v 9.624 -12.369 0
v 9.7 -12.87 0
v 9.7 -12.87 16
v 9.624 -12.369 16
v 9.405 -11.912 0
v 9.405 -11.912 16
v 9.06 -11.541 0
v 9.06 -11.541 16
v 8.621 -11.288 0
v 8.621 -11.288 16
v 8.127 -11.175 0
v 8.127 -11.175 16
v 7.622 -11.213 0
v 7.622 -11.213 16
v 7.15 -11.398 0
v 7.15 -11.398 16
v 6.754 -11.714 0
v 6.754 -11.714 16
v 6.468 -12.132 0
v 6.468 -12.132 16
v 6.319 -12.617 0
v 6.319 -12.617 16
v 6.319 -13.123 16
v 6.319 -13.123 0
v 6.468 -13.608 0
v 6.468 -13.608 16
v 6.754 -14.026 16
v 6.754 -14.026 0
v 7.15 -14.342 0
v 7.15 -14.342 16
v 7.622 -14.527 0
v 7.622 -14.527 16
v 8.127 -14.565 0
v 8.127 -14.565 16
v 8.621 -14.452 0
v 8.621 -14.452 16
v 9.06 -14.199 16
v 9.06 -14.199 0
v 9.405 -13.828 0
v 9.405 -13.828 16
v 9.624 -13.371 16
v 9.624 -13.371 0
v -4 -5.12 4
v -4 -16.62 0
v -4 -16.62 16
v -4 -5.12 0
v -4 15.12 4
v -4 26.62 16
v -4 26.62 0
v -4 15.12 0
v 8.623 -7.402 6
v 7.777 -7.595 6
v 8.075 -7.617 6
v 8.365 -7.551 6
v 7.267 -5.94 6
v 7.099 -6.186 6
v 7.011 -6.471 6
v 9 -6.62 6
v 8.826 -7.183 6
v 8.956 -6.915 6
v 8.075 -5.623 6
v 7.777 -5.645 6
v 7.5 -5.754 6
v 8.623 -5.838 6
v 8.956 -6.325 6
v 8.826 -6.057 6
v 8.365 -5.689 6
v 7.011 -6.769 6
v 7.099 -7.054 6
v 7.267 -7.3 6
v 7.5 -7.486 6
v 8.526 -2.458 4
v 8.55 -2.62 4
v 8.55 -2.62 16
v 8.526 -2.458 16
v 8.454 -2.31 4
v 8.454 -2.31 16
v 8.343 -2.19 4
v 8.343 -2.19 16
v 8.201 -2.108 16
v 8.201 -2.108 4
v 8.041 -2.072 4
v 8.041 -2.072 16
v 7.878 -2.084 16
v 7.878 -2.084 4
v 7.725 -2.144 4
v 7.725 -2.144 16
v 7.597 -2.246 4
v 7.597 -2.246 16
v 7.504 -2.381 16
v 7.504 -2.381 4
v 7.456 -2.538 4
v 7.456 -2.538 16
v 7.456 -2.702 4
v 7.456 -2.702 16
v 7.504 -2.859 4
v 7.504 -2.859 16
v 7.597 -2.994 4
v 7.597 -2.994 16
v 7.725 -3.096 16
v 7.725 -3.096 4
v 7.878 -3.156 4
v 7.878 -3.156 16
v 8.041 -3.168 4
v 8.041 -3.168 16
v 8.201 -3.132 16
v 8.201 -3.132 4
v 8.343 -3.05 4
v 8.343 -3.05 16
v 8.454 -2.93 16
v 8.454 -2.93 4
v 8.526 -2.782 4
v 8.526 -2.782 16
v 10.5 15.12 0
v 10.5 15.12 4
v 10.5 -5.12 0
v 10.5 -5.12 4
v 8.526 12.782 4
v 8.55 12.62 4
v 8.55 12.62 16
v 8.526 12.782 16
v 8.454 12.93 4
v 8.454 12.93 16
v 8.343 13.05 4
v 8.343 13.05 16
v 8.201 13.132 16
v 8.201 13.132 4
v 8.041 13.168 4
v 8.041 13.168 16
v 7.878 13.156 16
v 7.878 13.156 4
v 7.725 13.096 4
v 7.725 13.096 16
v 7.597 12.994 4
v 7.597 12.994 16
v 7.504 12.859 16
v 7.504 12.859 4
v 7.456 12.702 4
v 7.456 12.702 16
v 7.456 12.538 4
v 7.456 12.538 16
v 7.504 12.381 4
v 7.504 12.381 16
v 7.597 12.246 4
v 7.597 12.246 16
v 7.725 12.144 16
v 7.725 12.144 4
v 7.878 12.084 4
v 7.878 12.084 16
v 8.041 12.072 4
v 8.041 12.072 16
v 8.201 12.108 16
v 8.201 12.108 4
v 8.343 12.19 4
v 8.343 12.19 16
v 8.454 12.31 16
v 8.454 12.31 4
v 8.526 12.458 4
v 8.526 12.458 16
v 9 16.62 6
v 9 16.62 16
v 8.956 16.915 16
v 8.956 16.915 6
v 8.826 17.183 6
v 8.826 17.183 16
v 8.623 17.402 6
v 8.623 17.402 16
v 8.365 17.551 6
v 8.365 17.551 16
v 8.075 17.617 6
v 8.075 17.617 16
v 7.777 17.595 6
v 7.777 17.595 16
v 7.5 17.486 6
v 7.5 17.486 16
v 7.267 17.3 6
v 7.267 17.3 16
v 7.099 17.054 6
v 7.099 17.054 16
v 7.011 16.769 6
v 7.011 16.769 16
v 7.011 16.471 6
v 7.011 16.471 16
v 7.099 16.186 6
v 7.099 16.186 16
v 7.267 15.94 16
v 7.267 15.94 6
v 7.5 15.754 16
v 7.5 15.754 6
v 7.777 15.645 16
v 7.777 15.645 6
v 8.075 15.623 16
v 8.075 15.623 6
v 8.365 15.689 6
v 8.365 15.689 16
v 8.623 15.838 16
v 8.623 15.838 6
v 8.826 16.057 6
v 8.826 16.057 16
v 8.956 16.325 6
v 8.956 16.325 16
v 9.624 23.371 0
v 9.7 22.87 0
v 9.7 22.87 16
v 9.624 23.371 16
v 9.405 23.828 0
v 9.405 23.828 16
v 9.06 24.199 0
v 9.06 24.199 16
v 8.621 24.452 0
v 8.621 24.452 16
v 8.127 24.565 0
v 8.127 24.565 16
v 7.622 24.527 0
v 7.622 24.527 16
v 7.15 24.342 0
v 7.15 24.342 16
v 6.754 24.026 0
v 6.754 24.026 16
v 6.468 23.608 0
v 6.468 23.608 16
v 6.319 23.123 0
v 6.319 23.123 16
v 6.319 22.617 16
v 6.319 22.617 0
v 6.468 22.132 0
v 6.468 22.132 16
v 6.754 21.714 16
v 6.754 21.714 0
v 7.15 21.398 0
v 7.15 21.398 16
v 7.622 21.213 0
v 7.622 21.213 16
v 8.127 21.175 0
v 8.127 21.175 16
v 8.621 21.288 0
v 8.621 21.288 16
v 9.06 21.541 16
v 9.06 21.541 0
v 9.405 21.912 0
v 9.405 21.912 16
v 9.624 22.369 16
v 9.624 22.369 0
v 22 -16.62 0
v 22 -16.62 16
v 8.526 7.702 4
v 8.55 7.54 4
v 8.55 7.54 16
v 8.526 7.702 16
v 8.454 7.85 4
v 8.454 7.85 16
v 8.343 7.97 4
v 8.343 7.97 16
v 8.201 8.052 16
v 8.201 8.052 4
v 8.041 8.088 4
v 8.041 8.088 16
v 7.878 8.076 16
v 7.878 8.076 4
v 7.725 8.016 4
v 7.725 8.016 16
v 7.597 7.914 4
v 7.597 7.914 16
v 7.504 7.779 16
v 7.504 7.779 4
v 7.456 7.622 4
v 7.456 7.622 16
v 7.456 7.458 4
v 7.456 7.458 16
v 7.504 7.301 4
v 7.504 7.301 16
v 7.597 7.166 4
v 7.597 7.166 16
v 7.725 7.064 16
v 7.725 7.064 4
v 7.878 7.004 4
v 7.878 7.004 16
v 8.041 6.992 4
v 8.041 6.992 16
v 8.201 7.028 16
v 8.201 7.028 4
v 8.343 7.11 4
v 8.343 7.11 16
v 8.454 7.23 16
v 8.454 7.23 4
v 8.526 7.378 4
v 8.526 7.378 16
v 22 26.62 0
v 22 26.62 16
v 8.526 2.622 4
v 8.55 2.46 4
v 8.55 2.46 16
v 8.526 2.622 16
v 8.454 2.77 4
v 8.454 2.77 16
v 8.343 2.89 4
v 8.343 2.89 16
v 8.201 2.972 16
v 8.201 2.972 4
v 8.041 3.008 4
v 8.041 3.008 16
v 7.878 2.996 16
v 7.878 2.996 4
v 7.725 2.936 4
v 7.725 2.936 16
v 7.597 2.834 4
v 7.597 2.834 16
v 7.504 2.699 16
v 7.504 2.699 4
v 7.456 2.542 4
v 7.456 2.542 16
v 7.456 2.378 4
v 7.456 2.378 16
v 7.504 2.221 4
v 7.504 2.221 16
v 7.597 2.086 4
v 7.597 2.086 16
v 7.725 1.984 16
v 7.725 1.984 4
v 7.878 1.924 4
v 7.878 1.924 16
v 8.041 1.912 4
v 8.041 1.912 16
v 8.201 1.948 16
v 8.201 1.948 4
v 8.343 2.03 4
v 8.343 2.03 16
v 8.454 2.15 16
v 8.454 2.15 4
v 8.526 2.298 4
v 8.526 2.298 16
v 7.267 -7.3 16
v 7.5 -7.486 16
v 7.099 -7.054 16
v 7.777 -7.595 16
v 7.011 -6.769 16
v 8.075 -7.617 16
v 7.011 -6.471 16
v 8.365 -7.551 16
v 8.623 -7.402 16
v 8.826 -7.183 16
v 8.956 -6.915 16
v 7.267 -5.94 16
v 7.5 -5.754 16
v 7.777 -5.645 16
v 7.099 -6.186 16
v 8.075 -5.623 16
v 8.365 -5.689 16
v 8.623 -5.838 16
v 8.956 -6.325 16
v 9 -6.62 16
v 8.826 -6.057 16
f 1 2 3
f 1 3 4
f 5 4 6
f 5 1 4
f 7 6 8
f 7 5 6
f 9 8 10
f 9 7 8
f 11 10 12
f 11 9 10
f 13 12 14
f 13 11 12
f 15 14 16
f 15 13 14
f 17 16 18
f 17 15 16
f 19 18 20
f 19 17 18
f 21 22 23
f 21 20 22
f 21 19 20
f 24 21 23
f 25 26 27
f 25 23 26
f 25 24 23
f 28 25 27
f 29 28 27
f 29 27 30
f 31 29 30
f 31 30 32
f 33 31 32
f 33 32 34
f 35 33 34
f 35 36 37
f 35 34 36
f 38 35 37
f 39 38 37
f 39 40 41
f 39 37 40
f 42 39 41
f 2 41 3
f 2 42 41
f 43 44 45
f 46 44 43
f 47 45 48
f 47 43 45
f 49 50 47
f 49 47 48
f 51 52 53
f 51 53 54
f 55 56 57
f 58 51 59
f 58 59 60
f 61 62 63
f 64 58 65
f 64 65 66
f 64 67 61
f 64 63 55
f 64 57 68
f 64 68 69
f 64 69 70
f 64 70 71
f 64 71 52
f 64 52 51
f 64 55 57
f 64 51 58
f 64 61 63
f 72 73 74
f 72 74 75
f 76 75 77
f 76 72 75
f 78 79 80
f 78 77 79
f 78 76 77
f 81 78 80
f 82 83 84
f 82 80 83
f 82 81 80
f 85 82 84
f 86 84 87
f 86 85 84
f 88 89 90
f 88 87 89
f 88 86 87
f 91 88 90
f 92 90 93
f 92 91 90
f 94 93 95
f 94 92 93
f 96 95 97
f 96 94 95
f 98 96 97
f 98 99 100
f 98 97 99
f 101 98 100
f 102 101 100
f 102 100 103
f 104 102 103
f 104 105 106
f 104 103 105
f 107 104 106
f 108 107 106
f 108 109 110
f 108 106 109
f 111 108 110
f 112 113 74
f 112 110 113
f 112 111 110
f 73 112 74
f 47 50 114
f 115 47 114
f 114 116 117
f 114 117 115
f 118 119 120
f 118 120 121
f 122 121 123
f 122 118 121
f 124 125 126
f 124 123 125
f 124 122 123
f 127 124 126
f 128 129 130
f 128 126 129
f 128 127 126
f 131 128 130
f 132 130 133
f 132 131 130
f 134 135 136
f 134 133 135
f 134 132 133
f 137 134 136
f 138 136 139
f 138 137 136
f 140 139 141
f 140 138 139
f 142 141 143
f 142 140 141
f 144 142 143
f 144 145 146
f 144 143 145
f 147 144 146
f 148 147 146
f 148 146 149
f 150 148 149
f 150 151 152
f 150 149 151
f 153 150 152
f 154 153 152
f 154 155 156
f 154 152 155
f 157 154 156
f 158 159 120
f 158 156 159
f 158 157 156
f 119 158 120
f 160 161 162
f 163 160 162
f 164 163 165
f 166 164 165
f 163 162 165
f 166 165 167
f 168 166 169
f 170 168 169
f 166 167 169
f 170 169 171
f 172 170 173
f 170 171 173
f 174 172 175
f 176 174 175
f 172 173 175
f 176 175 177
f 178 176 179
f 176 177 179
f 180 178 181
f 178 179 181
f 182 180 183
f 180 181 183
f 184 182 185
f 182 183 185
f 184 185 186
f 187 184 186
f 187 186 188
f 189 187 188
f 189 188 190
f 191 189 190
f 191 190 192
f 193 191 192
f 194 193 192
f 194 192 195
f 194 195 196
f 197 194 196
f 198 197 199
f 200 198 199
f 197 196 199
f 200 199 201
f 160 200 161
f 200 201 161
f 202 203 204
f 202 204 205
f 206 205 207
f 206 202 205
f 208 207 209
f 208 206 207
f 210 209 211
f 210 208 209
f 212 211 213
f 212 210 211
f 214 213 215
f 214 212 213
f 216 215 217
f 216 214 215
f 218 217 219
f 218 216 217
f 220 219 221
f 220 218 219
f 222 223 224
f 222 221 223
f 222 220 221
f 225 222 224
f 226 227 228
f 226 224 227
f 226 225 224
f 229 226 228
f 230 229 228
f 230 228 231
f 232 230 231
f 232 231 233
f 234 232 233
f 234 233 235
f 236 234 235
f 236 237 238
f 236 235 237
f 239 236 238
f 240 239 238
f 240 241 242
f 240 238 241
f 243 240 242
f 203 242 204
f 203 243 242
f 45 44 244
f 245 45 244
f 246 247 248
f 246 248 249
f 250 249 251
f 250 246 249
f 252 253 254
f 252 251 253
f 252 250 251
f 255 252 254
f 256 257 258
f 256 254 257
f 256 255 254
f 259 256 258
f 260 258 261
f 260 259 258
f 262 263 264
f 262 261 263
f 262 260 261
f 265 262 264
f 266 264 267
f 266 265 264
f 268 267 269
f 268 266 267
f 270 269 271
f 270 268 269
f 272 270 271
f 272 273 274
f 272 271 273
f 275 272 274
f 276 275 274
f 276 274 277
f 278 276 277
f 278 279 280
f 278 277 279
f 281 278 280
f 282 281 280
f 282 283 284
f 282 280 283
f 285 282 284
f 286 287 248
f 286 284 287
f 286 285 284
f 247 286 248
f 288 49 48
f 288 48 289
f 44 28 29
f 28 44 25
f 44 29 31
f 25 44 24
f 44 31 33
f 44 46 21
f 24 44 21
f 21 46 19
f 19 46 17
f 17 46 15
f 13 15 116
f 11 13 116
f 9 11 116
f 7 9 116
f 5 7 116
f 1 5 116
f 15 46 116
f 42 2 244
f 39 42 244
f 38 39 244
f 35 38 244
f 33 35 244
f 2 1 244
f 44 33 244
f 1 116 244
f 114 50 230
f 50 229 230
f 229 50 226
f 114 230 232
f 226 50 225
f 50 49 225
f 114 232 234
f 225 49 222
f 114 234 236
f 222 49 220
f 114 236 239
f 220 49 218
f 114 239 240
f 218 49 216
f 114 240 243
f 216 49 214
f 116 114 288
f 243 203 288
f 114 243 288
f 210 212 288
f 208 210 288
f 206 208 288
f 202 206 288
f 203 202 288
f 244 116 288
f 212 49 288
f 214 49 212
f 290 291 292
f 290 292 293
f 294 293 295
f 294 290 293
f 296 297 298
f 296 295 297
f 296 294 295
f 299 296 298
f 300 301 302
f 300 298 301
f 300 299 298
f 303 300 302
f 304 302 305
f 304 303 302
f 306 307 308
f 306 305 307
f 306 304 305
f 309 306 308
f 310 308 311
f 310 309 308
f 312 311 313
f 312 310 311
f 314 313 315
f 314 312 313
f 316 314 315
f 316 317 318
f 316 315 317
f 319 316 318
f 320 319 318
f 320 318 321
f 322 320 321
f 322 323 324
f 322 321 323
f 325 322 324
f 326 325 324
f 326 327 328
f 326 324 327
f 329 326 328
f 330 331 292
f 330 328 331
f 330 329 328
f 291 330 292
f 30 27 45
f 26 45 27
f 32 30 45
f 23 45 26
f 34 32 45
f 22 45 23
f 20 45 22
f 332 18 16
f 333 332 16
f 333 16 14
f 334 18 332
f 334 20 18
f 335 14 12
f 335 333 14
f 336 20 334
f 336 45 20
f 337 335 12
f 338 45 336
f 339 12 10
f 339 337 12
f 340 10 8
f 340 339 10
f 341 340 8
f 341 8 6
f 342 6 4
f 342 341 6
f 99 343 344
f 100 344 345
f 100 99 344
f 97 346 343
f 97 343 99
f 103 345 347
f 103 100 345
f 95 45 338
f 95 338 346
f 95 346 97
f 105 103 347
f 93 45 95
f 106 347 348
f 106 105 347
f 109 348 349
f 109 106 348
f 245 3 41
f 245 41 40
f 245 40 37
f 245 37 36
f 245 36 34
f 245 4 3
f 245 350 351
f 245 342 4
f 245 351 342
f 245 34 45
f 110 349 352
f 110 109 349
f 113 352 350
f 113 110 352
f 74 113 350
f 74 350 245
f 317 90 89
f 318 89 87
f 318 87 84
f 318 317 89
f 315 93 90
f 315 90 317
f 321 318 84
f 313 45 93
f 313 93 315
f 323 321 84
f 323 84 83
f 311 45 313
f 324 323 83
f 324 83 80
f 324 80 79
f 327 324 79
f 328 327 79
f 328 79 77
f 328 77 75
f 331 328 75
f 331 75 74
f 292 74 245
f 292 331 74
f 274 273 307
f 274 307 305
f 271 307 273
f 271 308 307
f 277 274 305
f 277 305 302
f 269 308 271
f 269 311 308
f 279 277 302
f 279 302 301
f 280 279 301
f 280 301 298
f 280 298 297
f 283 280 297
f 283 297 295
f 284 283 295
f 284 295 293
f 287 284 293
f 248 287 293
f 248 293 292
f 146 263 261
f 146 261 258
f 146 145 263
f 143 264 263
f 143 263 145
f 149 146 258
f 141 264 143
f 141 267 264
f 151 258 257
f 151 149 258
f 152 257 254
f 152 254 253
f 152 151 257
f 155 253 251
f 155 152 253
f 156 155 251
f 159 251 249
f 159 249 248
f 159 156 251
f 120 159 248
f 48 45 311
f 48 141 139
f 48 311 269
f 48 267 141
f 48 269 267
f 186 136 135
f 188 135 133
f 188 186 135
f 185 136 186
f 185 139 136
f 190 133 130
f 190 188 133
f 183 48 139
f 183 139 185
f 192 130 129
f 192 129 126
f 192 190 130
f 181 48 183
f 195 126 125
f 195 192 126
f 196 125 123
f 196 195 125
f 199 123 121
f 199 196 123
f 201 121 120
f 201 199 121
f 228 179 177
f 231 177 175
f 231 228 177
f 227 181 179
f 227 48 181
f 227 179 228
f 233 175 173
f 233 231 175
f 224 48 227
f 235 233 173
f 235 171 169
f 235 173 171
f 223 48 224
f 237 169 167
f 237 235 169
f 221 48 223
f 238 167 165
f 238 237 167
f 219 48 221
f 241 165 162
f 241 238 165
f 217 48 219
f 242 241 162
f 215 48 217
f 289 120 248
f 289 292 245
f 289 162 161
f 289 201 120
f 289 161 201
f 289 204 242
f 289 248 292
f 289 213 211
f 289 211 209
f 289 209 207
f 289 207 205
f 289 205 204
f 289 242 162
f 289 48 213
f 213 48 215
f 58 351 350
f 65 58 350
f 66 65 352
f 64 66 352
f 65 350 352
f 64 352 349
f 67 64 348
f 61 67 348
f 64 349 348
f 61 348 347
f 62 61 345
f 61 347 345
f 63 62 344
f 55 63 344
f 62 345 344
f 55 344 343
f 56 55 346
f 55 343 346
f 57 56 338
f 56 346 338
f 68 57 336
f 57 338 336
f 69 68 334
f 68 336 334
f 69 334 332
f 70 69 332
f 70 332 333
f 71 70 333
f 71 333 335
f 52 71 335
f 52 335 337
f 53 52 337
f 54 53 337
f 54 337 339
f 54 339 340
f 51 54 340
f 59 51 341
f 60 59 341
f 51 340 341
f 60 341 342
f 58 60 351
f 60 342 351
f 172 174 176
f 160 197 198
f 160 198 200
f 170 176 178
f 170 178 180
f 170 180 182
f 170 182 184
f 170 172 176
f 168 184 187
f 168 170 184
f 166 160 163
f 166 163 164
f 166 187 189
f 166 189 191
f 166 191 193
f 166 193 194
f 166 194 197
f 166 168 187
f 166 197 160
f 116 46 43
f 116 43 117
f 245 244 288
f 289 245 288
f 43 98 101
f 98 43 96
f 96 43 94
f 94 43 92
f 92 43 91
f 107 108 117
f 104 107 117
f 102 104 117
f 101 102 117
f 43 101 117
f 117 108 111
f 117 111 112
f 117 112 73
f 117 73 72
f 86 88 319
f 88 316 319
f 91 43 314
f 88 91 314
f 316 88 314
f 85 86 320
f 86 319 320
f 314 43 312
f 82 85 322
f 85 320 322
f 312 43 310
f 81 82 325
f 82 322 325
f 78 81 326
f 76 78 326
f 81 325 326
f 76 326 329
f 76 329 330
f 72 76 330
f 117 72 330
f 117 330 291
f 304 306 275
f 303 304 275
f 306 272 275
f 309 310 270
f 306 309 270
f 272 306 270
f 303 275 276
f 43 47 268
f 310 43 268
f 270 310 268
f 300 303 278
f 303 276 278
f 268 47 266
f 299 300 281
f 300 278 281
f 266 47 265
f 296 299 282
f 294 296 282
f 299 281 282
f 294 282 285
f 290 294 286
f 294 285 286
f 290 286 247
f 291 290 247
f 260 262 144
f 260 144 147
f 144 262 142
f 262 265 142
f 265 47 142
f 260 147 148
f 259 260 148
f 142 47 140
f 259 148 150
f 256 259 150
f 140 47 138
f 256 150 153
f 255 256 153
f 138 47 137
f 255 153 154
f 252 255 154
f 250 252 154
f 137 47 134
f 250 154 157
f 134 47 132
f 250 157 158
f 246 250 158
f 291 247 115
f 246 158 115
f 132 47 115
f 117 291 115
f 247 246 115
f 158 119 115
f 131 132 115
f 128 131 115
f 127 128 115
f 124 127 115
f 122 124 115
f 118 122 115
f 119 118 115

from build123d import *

# Parameters (mm, degrees)
SKETCH1_W               = 26
SKETCH1_H               = 43.24
BOSS_EXTRUDE1_DEPTH     = 16
CUT_EXTRUDE1_DEPTH      = 39.06079873
CUT_EXTRUDE1_DEPTH_BACK = 39.06079873
SKETCH2_R               = 0.55
SKETCH2_R_2             = 1.7
SKETCH3_W               = 14.5
SKETCH3_H               = 20.24
CUT_EXTRUDE3_DEPTH      = 4
SKETCH4_R               = 1
CUT_EXTRUDE5_DEPTH      = 10


with BuildPart() as part:
    # Sketch1 → Boss-Extrude1 (new body)
    with BuildSketch(Plane.XY):
        with Locations((9, 5)):
            Rectangle(SKETCH1_W, SKETCH1_H)
    extrude(amount=BOSS_EXTRUDE1_DEPTH)

    # Sketch2 → Cut-Extrude1 (cut, two sides: drawn at the far end of the back side and taken through both)
    with BuildSketch(Plane.XY.offset(-CUT_EXTRUDE1_DEPTH_BACK)):
        with Locations((8, -2.62)):
            Circle(SKETCH2_R)
        with Locations((8, 2.46)):
            Circle(SKETCH2_R)
        with Locations((8, 7.54)):
            Circle(SKETCH2_R)
        with Locations((8, 12.62)):
            Circle(SKETCH2_R)
        with Locations((8, -12.87)):
            Circle(SKETCH2_R_2)
        with Locations((8, 22.87)):
            Circle(SKETCH2_R_2)
    extrude(amount=CUT_EXTRUDE1_DEPTH + CUT_EXTRUDE1_DEPTH_BACK, mode=Mode.SUBTRACT)

    # Sketch3 → Cut-Extrude3 (cut)
    with BuildSketch(Plane.XY):
        with Locations((3.25, 5)):
            Rectangle(SKETCH3_W, SKETCH3_H)
    extrude(amount=CUT_EXTRUDE3_DEPTH, mode=Mode.SUBTRACT)

    # Sketch4 → Cut-Extrude5 (cut)
    with BuildSketch(Plane.XY.offset(16)):
        with Locations((8, -6.62)):
            Circle(SKETCH4_R)
        with Locations((8, 16.62)):
            Circle(SKETCH4_R)
    extrude(amount=-CUT_EXTRUDE5_DEPTH, mode=Mode.SUBTRACT)


solid = part.part
